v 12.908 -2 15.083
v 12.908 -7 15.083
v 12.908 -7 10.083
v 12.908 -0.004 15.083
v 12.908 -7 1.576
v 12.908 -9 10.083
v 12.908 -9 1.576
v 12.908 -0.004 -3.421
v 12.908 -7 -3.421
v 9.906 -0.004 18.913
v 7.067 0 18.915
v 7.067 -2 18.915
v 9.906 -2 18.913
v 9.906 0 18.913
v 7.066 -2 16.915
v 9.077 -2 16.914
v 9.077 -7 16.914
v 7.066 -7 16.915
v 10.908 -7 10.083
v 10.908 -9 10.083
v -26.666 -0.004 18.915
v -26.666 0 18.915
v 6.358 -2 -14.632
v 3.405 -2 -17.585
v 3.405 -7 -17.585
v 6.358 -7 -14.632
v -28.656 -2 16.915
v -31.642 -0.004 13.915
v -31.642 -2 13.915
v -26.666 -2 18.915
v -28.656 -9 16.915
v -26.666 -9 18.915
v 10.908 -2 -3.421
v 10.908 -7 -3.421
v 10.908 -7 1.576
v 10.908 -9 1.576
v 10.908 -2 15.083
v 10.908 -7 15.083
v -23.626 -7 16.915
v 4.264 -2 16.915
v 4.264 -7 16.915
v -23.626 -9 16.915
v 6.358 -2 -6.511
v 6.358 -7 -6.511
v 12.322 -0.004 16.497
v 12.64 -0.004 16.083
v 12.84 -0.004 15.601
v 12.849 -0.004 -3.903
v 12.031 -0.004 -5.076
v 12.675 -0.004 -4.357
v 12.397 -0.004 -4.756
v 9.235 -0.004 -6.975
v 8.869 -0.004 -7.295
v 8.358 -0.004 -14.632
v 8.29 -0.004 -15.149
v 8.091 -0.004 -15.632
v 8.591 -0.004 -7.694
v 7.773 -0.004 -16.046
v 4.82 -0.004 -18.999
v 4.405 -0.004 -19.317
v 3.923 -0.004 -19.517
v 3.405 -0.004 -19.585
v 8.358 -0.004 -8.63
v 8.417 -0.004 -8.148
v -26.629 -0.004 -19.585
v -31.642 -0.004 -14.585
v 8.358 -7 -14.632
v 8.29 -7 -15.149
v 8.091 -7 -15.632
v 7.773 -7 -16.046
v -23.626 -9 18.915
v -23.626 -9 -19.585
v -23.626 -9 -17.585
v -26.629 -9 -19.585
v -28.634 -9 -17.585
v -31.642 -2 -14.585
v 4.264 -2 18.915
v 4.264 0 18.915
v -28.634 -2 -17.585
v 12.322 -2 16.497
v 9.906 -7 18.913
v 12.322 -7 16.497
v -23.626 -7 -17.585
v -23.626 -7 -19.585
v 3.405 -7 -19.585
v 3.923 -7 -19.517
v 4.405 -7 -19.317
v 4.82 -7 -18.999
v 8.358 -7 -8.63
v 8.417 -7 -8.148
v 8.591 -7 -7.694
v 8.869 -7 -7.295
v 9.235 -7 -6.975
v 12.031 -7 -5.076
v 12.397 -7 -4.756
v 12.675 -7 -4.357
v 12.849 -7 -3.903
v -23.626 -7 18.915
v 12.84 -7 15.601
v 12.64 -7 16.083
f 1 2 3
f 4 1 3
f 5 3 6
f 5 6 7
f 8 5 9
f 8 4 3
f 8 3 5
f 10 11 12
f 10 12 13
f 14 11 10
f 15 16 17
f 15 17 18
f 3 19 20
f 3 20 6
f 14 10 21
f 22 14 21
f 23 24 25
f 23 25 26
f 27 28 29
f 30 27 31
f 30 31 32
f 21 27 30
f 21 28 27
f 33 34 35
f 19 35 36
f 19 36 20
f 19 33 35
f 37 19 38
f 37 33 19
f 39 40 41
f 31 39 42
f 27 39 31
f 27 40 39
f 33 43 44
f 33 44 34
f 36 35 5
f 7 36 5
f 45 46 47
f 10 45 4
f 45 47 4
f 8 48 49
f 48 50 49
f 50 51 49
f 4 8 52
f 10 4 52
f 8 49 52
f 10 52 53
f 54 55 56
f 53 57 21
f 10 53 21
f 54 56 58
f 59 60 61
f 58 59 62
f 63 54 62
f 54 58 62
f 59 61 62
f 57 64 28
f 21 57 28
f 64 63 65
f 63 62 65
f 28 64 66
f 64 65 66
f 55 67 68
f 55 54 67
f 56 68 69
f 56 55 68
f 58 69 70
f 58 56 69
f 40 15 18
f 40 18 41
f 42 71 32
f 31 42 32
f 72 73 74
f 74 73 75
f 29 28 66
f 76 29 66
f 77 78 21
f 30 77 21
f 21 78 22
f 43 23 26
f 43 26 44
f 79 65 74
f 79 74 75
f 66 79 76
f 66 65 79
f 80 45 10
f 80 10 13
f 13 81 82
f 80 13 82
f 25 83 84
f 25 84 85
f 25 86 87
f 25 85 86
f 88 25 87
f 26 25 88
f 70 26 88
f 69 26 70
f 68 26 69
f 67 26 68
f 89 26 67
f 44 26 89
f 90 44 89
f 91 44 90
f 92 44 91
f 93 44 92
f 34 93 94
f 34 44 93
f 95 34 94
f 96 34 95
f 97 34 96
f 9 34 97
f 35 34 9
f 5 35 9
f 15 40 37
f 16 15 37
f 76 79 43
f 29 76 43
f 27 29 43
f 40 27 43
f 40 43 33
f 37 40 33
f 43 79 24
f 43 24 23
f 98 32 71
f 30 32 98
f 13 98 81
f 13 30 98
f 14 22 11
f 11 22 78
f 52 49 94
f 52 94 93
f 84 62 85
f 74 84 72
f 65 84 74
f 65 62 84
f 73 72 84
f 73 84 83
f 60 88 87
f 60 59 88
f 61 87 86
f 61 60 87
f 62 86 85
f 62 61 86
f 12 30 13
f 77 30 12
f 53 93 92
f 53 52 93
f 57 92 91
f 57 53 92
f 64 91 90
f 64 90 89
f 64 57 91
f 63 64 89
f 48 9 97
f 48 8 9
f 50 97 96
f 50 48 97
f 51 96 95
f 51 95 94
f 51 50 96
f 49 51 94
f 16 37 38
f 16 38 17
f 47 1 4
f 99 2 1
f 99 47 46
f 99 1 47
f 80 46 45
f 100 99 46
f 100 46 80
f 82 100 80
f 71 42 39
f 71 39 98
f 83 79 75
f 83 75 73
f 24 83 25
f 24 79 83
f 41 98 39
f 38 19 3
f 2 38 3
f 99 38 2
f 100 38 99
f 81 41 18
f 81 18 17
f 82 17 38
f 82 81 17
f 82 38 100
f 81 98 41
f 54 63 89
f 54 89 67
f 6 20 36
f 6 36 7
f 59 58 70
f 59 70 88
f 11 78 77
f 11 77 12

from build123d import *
from OCP.BRepFilletAPI import BRepFilletAPI_MakeChamfer

# Parameters (mm, degrees)
SKETCH1_W               = 41
SKETCH1_H               = 34.5
SKETCH1_W_2             = 35
SKETCH1_H_2             = 28.5
BOSS_EXTRUDE1_DEPTH     = 5
SKETCH2_W               = 35
SKETCH2_H               = 28.5
BOSS_EXTRUDE2_DEPTH     = 1
SKETCH6_W               = 34.5
SKETCH6_H               = 5
CUT_EXTRUDE2_DEPTH      = 3
SKETCH7_W               = 1.6
SKETCH7_H               = 3
SKETCH7_H_2             = 3.078736203
BOSS_EXTRUDE3_DEPTH     = 4
CHAMFER1_SIZE           = 3
SKETCH14_W              = 3.502632447
SKETCH14_H              = 20.452559449
CUT_EXTRUDE6_DEPTH      = 10
BOSS_EXTRUDE5_DEPTH     = 4
BOSS_EXTRUDE7_DEPTH     = 1
SKETCH9_W               = 3.28281374
SKETCH9_H               = 22.420706044
CUT_EXTRUDE3_DEPTH      = 4
BOSS_EXTRUDE4_DEPTH     = 2
SKETCH12_W              = 3.28281374
SKETCH12_H              = 22.420706044
CUT_EXTRUDE4_DEPTH      = 0.003863752
BOSS_EXTRUDE8_DEPTH     = 2
BOSS_EXTRUDE9_DEPTH     = 2
CUT_EXTRUDE7_DEPTH      = 38.864903937
CUT_EXTRUDE7_DEPTH_BACK = 4
CHAMFER2_SIZE           = 3
CHAMFER2_SIZE_2         = 3.001586398
CHAMFER2_SIZE2          = 3
CHAMFER3_SIZE           = 2
BOSS_EXTRUDE10_DEPTH    = 7
CUT_EXTRUDE8_START      = -2
CUT_EXTRUDE8_DEPTH      = 7
CUT_EXTRUDE9_DEPTH      = 7
CUT_EXTRUDE11_START     = 1
CUT_EXTRUDE11_DEPTH     = 10
CUT_EXTRUDE12_DEPTH     = 10
SKETCH30_W              = 2.837179027
SKETCH30_H              = 7
CUT_EXTRUDE13_DEPTH     = 10
BOSS_EXTRUDE11_DEPTH    = 7
CUT_EXTRUDE14_DEPTH     = 7
SKETCH35_W              = 36.645868519
SKETCH35_H              = 38.499838471
CUT_EXTRUDE15_DEPTH     = 2
SKETCH37_W              = 2
SKETCH37_H              = 8.507497338
BOSS_EXTRUDE12_DEPTH    = 2
FILLET2_R               = 2


with BuildPart() as part:
    # Sketch1 → Boss-Extrude1 (new body)
    with BuildSketch(Plane(origin=(0, 0, 0), x_dir=(1, 0, 0), z_dir=(0, 1, 0))):
        with Locations((-14.14154724, 0.334775681)):
            Rectangle(SKETCH1_W, SKETCH1_H)
        with Locations((-14.14154724, 0.334775681)):
            Rectangle(SKETCH1_W_2, SKETCH1_H_2, mode=Mode.SUBTRACT)
    extrude(amount=BOSS_EXTRUDE1_DEPTH)

    # Sketch2 → Boss-Extrude2 (add)
    with BuildSketch(Plane(origin=(0, 0, 0), x_dir=(1, 0, 0), z_dir=(0, 1, 0))):
        with Locations((-14.14154724, 0.334775681)):
            Rectangle(SKETCH2_W, SKETCH2_H)
    extrude(amount=BOSS_EXTRUDE2_DEPTH)

    # Sketch6 → Cut-Extrude2 (cut)
    with BuildSketch(Plane.ZY.offset(34.64154724)):
        with Locations((-0.334775681, 2.5)):
            Rectangle(SKETCH6_W, SKETCH6_H)
    extrude(amount=-CUT_EXTRUDE2_DEPTH, mode=Mode.SUBTRACT)

    # Sketch7 → Boss-Extrude3 (add)
    with BuildSketch(Plane(origin=(0, 1, 0), x_dir=(1, 0, 0), z_dir=(0, 1, 0))):
        with Locations((-30.84154724, 13.084775681)):
            Rectangle(SKETCH7_W, SKETCH7_H)
        with Locations((-30.84154724, -12.375856218)):
            Rectangle(SKETCH7_W, SKETCH7_H_2)
    extrude(amount=BOSS_EXTRUDE3_DEPTH)

    # Chamfer1
    chamfer1_edges = [part.edges().sort_by_distance(p)[0] for p in [
        (-31.64154724, 2.5, -17.584775681),
        (-31.64154724, 2.5, 16.915224319),
        (6.35845276, 2.5, -17.584775681),
        (6.35845276, 2.5, 16.915224319),
    ]]
    chamfer(chamfer1_edges, length=CHAMFER1_SIZE)

    # Sketch14 → Cut-Extrude6 (cut)
    with BuildSketch(Plane(origin=(0, 1, 0), x_dir=(1, 0, 0), z_dir=(0, 1, 0))):
        with Locations((5.109768984, -7.134544415)):
            Rectangle(SKETCH14_W, SKETCH14_H)
    extrude(amount=CUT_EXTRUDE6_DEPTH, mode=Mode.SUBTRACT)

    # Sketch17 → Boss-Extrude5 (add)
    with BuildSketch(Plane(origin=(0, 1, 0), x_dir=(1, 0, 0), z_dir=(0, 1, 0))):
        Polygon((3.35845276, 3.09173531), (7.910000942, 0), (7.910000942, -13.915224319), (3.35845276, -13.915224319), (3.35845276, -16.915224319), (10.910000942, -16.915224319), (10.910000942, 3.419581668), (3.35845276, 8.549130391), align=None)
    extrude(amount=BOSS_EXTRUDE5_DEPTH)

    # Sketch19 → Boss-Extrude7 (add)
    with BuildSketch(Plane.XZ):
        Polygon((3.35845276, 16.915224319), (10.910000942, 16.915224319), (10.910000942, -3.419581668), (6.35845276, -6.511316978), (6.35845276, 13.915224319), align=None)
    extrude(amount=-BOSS_EXTRUDE7_DEPTH)

    # Sketch9 → Cut-Extrude3 (cut)
    with BuildSketch(Plane(origin=(0, 1, 0), x_dir=(1, 0, 0), z_dir=(0, 1, 0))):
        with Locations((-30.00014037, 0.374422659)):
            Rectangle(SKETCH9_W, SKETCH9_H)
    extrude(amount=-CUT_EXTRUDE3_DEPTH, mode=Mode.SUBTRACT)

    # Sketch11 → Boss-Extrude4 (add)
    with BuildSketch(Plane.XZ):
        Polygon((-26.665503706, 18.915224319), (-31.64154724, 13.915224319), (-31.64154724, -14.584775681), (-26.629189212, -19.584775681), (4.233785533, -19.584775681), (8.35845276, -15.460108453), (8.35845276, 14.743651444), (4.263960312, 18.915224319), align=None)
    extrude(amount=BOSS_EXTRUDE4_DEPTH)

    # Sketch12 → Cut-Extrude4 (cut)
    with BuildSketch(Plane(origin=(0, 0, 0), x_dir=(1, 0, 0), z_dir=(0, 1, 0))):
        with Locations((-30.00014037, 0.374422659)):
            Rectangle(SKETCH12_W, SKETCH12_H)
    extrude(amount=-CUT_EXTRUDE4_DEPTH, mode=Mode.SUBTRACT)

    # Sketch20 → Boss-Extrude8 (add)
    with BuildSketch(Plane.XZ):
        Polygon((6.227005221, 16.915224319), (10.910000942, 16.915224319), (10.910000942, -3.419581668), (8.35845276, -5.152774704), (8.35845276, 14.743651444), align=None)
    extrude(amount=BOSS_EXTRUDE8_DEPTH)

    # Sketch21 → Boss-Extrude9 (add)
    with BuildSketch(Plane(origin=(0, 0, 0), x_dir=(1, 0, 0), z_dir=(0, 1, 0))):
        Polygon((8.35845276, 7.570549944), (8.35845276, 5.152774704), (10.90766939, 3.421165424), (10.90766939, -16.912751148), (6.227005221, -16.915224319), (4.263960312, -18.915224319), (7.06681334, -18.91478086), (12.90766939, -18.911694666), (12.90766939, 4.480398389), align=None)
    extrude(amount=-BOSS_EXTRUDE9_DEPTH)

    # Sketch23 → Cut-Extrude7 (cut, two sides)
    with BuildSketch(Plane(origin=(0, 5, 0), x_dir=(1, 0, 0), z_dir=(0, 1, 0))) as cut_extrude7_sk:
        Polygon((7.910000942, 0), (7.910000942, 1.828776855), (3.35845276, 4.913740582), (3.35845276, 3.09173531), align=None)
    extrude(amount=CUT_EXTRUDE7_DEPTH, mode=Mode.SUBTRACT)
    extrude(cut_extrude7_sk.sketch, amount=-CUT_EXTRUDE7_DEPTH_BACK, mode=Mode.SUBTRACT)

    # Chamfer2: one chamfer whose edges measure the first distance from different faces: ONE call of the kernel's chamfer builder (chamfer() names one face for all edges)
    chamfer2_edges_1 = [part.edges().sort_by_distance(p)[0] for p in [
        (10.910000942, 2.5, 16.915224319),
    ]]
    chamfer2_edges_2 = [part.edges().sort_by_distance(p)[0] for p in [
        (12.90766939, -1, 18.911694666),
    ]]
    chamfer2_side_2 = [part.faces().sort_by_distance(p)[0] for p in [
        (9.987241365, -1, 18.913237763),
    ]]
    chamfer2 = BRepFilletAPI_MakeChamfer(part.part.solid().wrapped)
    for e in chamfer2_edges_1:
        chamfer2.Add(CHAMFER2_SIZE, e.wrapped)
    for e in chamfer2_edges_2:
        chamfer2.Add(CHAMFER2_SIZE_2, CHAMFER2_SIZE2, e.wrapped, chamfer2_side_2[0].wrapped)  # the first distance lies on this face
    add(Compound.cast(chamfer2.Shape()), mode=Mode.REPLACE)

    # Chamfer3
    chamfer3_edges = [part.edges().sort_by_distance(p)[0] for p in [
        (7.910000942, 3, 13.915224319),
    ]]
    chamfer(chamfer3_edges, length=CHAMFER3_SIZE)

    # Sketch25 → Boss-Extrude10 (add)
    with BuildSketch(Plane(origin=(0, 0, 0), x_dir=(1, 0, 0), z_dir=(0, 1, 0))):
        Polygon((-28.64154724, 17.584775681), (-26.629189212, 19.584775681), (4.233785533, 19.584775681), (8.35845276, 15.460108453), (8.35845276, 7.570549944), (12.90766939, 4.480398389), (12.90766939, -15.911694666), (9.906083411, -18.913280645), (-26.665503706, -18.915224319), (-28.64154724, -16.915224319), (7.910000942, -16.915224319), (10.910000942, -13.915224319), (10.910000942, 3.419581668), (6.35845276, 6.511316978), (6.35845276, 14.584775681), (3.35845276, 17.584775681), align=None)
    extrude(amount=BOSS_EXTRUDE10_DEPTH)

    # Sketch26 → Cut-Extrude8 (cut)
    with BuildSketch(Plane.XZ.offset(2).offset(CUT_EXTRUDE8_START)):
        Polygon((10.90766939, -3.421165424), (10.90766939, 15.083267541), (9.077218609, 16.913718322), (7.066126742, 16.914780944), (4.263802095, 16.915224319), (-25.834261771, 16.915224319), (-29.64154724, 13.089609206), (-29.64154724, -13.754902141), (-25.802207763, -17.584775681), (3.405358408, -17.584775681), (6.35845276, -14.631681329), (6.35845276, -6.511316978), align=None)
    extrude(amount=-CUT_EXTRUDE8_DEPTH, mode=Mode.SUBTRACT)

    # Sketch27 → Cut-Extrude9 (cut)
    with BuildSketch(Plane(origin=(0, 0, 0), x_dir=(1, 0, 0), z_dir=(0, 1, 0))):
        Polygon((-25.802207763, 17.584775681), (-28.64154724, 17.584775681), (-31.64154724, 14.584775681), (-31.64154724, 11.584775681), (-29.64154724, 11.584775681), (-29.64154724, 13.754902141), align=None)
        Polygon((-29.64154724, -10.835930363), (-29.64154724, -13.089609206), (-25.834261771, -16.915224319), (-28.64154724, -16.915224319), (-31.64154724, -13.915224319), (-31.64154724, -10.835930363), align=None)
    extrude(amount=CUT_EXTRUDE9_DEPTH, mode=Mode.SUBTRACT)

    # Sketch28 → Cut-Extrude11 (cut)
    with BuildSketch(Plane(origin=(0, -0.003863752, 0), x_dir=(1, 0, 0), z_dir=(0, 1, 0)).offset(CUT_EXTRUDE11_START)):
        Polygon((-31.64154724, -13.915224319), (-26.665503706, -18.915224319), (9.906083411, -18.913280645), (12.90766939, -15.911694666), (12.90766939, 4.480398389), (8.35845276, 7.570549944), (8.35845276, 15.460108453), (4.233785533, 19.584775681), (-26.629189212, 19.584775681), (-31.64154724, 14.584775681), align=None)
    extrude(amount=CUT_EXTRUDE11_DEPTH, mode=Mode.SUBTRACT)

    # Sketch29 → Cut-Extrude12 (cut)
    with BuildSketch(Plane(origin=(0, -0.003863752, 0), x_dir=(1, 0, 0), z_dir=(0, 1, 0))):
        Polygon((-31.64154724, 14.584775681), (-26.629189212, 19.584775681), (4.233785533, 19.584775681), (8.35845276, 15.460108453), (8.35845276, 7.570549944), (12.90766939, 4.480398389), (12.90766939, -15.911694666), (9.906083411, -18.913280645), (-26.665503706, -18.915224319), (-31.64154724, -13.915224319), align=None)
    extrude(amount=CUT_EXTRUDE12_DEPTH, mode=Mode.SUBTRACT)


with BuildPart() as cut_extrude12_piece_1:
    # of the separate pieces the step leaves, piece 1, a body of its own (cut_extrude12_pieces)
    add(part.part.solids().sort_by_distance((-31.64154724, -0.003863752, -14.584775681))[0])

    # Sketch31 → Boss-Extrude11 (add)
    with BuildSketch(Plane.XZ.offset(2)):
        Polygon((6.35845276, -6.511316978), (10.90766939, -3.421165424), (10.90766939, 15.083267541), (9.077218609, 16.913718322), (7.066126742, 16.914780944), (4.263802095, 16.915224319), (-25.834261771, 16.915224319), (-29.64154724, 13.089609206), (-31.64154724, 13.915224319), (-26.665503706, 18.915224319), (9.906083411, 18.913280645), (12.90766939, 15.911694666), (12.90766939, -4.480398389), (8.35845276, -7.570549944), (8.35845276, -15.460108453), (4.233785533, -19.584775681), (-26.629189212, -19.584775681), (-31.64154724, -14.584775681), (-29.64154724, -13.754902141), (-25.802207763, -17.584775681), (3.405358408, -17.584775681), (6.35845276, -14.631681329), align=None)
    extrude(amount=BOSS_EXTRUDE11_DEPTH)

    # Sketch32 → Cut-Extrude14 (cut)
    with BuildSketch(Plane.XZ.offset(2)):
        Polygon((-25.834261771, 16.915224319), (-25.802207763, -17.584775681), (-29.64154724, -13.754902141), (-31.64154724, -14.584775681), (-31.64154724, 13.915224319), (-29.64154724, 13.089609206), align=None)
        Polygon((-29.64154724, 13.089609206), (-25.834261771, 16.915224319), (-36.844784184, 16.915224319), (-37.593826415, -17.584775681), (-25.802207763, -17.584775681), (-29.64154724, -13.754902141), (-31.64154724, -14.584775681), (-31.64154724, 13.915224319), align=None)
    extrude(amount=CUT_EXTRUDE14_DEPTH, mode=Mode.SUBTRACT)

    # Sketch35 → Cut-Extrude15 (cut)
    with BuildSketch(Plane.XZ.offset(9)):
        with Locations((-5.303289834, -0.334856445)):
            Rectangle(SKETCH35_W, SKETCH35_H)
    extrude(amount=-CUT_EXTRUDE15_DEPTH, mode=Mode.SUBTRACT)

    # Sketch37 → Boss-Extrude12 (add)
    with BuildSketch(Plane.XZ.offset(7)):
        with Locations((11.90766939, 5.829727419)):
            Rectangle(SKETCH37_W, SKETCH37_H)
    extrude(amount=BOSS_EXTRUDE12_DEPTH)

    # Fillet2
    fillet2_edges = [cut_extrude12_piece_1.edges().sort_by_distance(p)[0] for p in [
        (12.90766939, -3.501931876, -4.480398389),
        (8.35845276, -3.501931876, -7.570549944),
        (4.233785533, -3.501931876, -19.584775681),
        (8.35845276, -3.501931876, -15.460108453),
        (12.90766939, -3.501931876, 15.911694666),
    ]]
    fillet(fillet2_edges, radius=FILLET2_R)


with BuildPart() as cut_extrude12_piece_2:
    # of the separate pieces the step leaves, piece 2, a body of its own (cut_extrude12_pieces)
    add(part.part.solids().sort_by_distance((-28.634132423, 0, -17.584775681))[0])

    # Sketch30 → Cut-Extrude13 (cut)
    with BuildSketch(Plane(origin=(-23.02477977, 0, -23.167050199), x_dir=(-0.7092812996014342, 0, 0.7049255549600261), z_dir=(-0.7049255549600261, 0, -0.7092812996014342))):
        with Locations((6.500366579, 3.5)):
            Rectangle(SKETCH30_W, SKETCH30_H)
    extrude(amount=-CUT_EXTRUDE13_DEPTH, mode=Mode.SUBTRACT)


solid = cut_extrude12_piece_1.part
